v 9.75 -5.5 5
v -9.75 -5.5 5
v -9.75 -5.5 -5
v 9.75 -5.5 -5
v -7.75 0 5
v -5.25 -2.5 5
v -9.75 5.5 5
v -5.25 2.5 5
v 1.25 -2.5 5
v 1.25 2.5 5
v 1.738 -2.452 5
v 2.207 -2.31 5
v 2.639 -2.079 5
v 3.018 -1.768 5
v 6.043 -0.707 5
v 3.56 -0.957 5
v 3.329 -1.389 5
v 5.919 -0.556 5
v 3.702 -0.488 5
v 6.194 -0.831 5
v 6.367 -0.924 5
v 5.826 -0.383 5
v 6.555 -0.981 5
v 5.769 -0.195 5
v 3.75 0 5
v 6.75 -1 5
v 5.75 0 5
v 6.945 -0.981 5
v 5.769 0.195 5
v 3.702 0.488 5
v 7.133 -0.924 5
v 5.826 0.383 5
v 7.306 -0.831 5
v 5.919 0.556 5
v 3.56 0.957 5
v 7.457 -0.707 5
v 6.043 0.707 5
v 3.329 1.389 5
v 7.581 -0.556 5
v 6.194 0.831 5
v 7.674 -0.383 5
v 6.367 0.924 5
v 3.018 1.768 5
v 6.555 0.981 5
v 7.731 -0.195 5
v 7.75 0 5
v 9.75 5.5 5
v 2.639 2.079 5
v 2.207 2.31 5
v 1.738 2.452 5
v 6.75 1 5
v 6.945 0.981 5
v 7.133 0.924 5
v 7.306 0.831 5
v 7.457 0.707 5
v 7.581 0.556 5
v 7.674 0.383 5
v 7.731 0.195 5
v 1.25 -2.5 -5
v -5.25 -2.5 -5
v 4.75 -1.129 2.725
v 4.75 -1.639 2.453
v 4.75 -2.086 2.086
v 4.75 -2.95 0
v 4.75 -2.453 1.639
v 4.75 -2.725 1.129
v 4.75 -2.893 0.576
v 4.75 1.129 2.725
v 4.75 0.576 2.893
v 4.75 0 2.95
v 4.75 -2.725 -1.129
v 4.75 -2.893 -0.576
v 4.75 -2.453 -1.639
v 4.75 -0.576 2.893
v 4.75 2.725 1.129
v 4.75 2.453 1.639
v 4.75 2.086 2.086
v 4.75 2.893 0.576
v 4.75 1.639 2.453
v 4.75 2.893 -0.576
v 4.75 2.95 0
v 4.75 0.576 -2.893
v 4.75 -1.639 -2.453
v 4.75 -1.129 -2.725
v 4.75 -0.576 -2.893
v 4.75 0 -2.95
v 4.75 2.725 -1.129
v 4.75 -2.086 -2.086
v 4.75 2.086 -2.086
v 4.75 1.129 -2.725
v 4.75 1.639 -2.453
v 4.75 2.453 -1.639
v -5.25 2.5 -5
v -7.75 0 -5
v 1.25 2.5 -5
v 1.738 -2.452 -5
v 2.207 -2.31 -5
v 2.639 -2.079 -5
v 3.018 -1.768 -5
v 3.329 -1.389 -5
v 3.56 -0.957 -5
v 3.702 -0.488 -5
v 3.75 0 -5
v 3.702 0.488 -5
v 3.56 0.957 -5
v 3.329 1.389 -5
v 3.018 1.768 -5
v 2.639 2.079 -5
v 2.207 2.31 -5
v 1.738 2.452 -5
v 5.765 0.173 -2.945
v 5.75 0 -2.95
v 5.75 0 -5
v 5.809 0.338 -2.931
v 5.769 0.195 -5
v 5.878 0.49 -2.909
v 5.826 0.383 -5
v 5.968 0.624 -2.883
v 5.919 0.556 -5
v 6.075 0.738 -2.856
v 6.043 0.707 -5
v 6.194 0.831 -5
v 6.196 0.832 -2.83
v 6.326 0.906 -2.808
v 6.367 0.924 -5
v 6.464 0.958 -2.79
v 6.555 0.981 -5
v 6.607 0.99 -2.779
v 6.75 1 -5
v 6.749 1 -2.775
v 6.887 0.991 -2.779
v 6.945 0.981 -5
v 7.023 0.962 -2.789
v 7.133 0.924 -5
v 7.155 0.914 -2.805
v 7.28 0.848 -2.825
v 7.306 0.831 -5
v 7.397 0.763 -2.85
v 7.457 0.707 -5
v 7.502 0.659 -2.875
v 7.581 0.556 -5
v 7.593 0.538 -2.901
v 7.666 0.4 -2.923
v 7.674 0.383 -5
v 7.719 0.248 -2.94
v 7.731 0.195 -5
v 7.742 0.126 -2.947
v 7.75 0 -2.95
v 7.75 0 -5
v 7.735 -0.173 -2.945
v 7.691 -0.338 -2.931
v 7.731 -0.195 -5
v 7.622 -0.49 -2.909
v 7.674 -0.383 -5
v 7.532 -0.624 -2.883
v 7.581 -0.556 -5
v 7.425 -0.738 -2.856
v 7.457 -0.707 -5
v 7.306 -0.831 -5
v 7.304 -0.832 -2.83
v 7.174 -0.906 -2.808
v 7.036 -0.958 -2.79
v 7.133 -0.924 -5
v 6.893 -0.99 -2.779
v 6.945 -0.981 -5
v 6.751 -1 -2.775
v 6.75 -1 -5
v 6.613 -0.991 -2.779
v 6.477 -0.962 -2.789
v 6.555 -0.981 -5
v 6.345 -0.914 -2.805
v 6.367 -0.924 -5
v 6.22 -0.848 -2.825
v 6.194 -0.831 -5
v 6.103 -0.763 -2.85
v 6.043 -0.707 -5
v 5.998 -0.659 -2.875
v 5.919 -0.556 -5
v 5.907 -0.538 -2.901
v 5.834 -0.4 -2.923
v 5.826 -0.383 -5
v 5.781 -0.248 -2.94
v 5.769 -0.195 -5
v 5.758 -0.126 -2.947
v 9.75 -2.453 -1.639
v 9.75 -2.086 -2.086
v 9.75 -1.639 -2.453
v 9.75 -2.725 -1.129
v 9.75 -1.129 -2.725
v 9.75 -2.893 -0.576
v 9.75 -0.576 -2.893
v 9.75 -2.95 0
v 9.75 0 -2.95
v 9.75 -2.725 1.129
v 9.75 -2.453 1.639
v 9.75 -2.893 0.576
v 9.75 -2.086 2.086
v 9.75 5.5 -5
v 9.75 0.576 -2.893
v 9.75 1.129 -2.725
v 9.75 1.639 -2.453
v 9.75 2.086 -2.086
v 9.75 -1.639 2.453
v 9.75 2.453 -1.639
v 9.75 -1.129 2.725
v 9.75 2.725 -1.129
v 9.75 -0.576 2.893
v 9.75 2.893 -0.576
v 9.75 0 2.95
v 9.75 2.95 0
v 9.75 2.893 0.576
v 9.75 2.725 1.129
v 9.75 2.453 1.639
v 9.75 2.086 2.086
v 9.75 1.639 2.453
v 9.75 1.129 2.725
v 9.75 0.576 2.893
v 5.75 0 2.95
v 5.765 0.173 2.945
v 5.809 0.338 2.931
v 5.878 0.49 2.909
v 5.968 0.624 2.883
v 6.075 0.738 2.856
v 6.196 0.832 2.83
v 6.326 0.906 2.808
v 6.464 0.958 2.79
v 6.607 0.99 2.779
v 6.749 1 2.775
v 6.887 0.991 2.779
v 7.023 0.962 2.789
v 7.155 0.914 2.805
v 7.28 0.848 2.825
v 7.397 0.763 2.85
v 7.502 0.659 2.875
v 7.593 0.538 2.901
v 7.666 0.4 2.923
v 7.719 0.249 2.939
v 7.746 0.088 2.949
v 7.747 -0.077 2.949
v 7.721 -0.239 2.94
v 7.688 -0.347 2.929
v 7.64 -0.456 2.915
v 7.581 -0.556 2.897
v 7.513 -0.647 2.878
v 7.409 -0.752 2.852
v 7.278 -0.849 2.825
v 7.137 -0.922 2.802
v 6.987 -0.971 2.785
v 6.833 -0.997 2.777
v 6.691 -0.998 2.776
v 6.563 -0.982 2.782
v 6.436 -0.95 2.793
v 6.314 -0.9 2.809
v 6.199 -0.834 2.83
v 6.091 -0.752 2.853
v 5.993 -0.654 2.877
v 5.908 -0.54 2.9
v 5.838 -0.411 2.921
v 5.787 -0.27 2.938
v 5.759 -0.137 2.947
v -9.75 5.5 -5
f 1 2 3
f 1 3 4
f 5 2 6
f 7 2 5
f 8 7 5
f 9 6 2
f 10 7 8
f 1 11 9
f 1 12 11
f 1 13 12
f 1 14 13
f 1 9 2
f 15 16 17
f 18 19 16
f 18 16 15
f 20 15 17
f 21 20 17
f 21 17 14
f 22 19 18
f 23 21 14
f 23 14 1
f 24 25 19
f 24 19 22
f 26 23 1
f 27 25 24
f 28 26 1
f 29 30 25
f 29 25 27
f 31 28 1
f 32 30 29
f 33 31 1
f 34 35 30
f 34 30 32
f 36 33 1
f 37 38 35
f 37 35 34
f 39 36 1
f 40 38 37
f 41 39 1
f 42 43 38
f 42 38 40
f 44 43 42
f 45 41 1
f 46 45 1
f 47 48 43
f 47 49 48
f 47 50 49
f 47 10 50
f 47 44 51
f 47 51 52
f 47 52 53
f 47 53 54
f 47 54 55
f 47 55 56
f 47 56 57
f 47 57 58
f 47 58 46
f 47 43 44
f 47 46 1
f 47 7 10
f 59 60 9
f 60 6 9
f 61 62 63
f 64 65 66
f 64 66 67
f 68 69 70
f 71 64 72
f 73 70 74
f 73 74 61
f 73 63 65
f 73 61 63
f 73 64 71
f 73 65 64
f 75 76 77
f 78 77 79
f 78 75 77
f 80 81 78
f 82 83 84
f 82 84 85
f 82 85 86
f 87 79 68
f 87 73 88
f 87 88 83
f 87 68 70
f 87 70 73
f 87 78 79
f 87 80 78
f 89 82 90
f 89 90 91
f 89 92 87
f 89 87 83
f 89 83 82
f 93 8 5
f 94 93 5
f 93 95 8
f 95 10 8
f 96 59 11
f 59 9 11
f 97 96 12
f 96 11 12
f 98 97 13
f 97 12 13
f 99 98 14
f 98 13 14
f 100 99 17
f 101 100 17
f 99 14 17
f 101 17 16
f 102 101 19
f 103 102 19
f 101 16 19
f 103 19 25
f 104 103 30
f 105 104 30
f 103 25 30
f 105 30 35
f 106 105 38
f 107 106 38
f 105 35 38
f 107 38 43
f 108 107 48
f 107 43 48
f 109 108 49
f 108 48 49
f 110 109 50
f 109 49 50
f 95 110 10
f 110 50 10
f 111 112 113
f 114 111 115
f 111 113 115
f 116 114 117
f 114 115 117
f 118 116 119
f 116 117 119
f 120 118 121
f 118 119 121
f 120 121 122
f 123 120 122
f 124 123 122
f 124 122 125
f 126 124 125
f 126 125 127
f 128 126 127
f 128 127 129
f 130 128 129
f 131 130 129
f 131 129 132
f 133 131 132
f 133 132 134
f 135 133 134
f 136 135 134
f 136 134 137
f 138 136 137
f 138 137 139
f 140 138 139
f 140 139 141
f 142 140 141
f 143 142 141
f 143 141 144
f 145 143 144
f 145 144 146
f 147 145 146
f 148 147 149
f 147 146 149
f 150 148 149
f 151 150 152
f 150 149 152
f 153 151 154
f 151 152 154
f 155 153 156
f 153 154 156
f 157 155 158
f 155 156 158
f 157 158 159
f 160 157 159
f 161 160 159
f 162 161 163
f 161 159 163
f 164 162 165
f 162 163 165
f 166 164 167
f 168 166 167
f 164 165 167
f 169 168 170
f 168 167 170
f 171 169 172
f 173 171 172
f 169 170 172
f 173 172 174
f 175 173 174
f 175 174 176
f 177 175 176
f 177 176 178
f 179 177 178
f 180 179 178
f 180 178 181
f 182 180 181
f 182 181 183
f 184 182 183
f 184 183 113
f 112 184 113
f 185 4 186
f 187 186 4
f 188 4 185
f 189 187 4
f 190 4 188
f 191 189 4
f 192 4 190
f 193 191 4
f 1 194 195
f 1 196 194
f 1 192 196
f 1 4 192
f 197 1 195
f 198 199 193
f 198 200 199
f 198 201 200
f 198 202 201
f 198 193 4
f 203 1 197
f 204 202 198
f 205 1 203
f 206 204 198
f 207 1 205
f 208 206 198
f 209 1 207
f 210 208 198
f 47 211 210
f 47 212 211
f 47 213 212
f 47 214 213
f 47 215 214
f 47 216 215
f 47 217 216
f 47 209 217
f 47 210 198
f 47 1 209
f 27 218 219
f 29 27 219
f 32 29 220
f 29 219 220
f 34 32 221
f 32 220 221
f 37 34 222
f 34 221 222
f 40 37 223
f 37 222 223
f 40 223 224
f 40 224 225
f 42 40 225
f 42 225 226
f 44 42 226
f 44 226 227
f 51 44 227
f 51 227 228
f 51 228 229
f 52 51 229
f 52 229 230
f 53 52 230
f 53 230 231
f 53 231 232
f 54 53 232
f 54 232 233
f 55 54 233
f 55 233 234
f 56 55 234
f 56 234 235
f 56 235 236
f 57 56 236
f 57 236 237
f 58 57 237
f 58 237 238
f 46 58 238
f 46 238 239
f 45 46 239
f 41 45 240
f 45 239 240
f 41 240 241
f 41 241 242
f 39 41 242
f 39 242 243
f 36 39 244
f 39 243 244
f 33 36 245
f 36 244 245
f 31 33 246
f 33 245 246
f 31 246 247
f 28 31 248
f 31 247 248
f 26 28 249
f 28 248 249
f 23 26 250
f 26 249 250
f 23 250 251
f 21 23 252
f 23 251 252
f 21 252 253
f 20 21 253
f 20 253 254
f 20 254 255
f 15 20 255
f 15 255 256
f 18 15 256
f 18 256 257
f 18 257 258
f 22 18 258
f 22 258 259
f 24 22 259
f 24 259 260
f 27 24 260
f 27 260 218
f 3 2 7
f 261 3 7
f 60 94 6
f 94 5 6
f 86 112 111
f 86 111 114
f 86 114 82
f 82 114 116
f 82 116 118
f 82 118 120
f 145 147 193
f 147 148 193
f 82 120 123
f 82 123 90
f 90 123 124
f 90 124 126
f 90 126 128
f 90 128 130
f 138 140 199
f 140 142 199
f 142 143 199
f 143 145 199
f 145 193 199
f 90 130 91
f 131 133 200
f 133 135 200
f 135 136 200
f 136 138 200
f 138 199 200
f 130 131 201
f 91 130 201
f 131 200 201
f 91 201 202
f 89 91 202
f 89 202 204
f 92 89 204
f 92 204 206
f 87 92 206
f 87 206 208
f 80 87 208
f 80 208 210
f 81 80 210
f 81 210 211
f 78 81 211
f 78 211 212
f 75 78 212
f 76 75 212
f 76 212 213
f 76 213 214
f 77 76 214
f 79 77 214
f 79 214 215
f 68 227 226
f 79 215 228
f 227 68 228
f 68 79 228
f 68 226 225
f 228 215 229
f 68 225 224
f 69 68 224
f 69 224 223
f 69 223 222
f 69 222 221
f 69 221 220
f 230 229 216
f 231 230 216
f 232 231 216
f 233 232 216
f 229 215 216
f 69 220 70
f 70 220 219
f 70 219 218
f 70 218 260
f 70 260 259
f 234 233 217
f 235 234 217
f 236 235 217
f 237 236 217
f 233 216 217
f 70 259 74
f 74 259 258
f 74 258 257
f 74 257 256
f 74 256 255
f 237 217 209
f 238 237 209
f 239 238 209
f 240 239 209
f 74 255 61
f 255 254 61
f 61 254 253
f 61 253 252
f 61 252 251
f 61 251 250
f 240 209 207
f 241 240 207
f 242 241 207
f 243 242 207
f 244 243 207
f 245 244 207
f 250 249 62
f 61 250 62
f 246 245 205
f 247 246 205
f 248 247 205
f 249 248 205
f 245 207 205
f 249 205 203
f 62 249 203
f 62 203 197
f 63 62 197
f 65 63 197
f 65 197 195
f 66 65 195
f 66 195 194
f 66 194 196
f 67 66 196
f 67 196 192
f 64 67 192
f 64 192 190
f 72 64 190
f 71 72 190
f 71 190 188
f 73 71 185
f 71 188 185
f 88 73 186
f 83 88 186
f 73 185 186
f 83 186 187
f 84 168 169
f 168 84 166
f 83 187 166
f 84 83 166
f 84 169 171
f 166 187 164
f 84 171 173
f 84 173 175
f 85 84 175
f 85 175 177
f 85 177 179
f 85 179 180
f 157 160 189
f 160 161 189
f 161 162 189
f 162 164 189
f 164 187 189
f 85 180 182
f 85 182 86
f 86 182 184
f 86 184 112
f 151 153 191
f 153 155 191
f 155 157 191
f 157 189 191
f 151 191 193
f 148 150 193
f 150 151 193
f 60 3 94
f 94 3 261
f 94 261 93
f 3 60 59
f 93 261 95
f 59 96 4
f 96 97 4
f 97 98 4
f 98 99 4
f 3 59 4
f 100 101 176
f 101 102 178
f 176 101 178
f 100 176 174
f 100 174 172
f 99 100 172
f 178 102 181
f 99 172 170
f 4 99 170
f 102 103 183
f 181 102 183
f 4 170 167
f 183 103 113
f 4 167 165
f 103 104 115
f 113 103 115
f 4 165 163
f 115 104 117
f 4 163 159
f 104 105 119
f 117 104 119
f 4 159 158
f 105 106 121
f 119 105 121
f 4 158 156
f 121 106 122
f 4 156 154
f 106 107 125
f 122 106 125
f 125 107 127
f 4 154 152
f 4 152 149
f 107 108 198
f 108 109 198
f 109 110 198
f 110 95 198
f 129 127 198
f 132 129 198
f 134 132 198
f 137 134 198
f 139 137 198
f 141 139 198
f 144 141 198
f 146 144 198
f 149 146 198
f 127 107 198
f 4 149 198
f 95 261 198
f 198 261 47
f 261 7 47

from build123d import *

# Parameters (mm, degrees)
SKETCH_1_W            = 19.5
SKETCH_1_H            = 11
EXTRUDE_1_DEPTH       = 5
SKETCH_2_R            = 2.95
CUT_EXTRUDE_1_DEPTH   = 5
HOLE_WIZARD_2_0_2_1_D = 2


with BuildPart() as part:
    # 草图1 → 凸台-拉伸1 (new, symmetric)
    with BuildSketch(Plane.XY):
        Rectangle(SKETCH_1_W, SKETCH_1_H)
        with BuildLine():
            Line((-5.25, 2.5), (-7.75, 0))
            Line((-7.75, 0), (-5.25, -2.5))
            Line((-5.25, -2.5), (1.25, -2.5))
            ThreePointArc((1.25, -2.5), (3.75, 0), (1.25, 2.5))
            Line((1.25, 2.5), (-5.25, 2.5))
        make_face(mode=Mode.SUBTRACT)
    extrude(amount=EXTRUDE_1_DEPTH, both=True)

    # 草图2 → 切除-拉伸1 (cut)
    with BuildSketch(Plane(origin=(9.75, 0, 0), x_dir=(0, 0, -1), z_dir=(1, 0, 0))):
        Circle(SKETCH_2_R)
    extrude(amount=-CUT_EXTRUDE_1_DEPTH, mode=Mode.SUBTRACT)

    # Ø2.0 (2) 直径孔1 (through all)
    with Locations(Plane.XY.offset(5)):
        with Locations((6.75, 0)):
            Hole(HOLE_WIZARD_2_0_2_1_D / 2)


solid = part.part
